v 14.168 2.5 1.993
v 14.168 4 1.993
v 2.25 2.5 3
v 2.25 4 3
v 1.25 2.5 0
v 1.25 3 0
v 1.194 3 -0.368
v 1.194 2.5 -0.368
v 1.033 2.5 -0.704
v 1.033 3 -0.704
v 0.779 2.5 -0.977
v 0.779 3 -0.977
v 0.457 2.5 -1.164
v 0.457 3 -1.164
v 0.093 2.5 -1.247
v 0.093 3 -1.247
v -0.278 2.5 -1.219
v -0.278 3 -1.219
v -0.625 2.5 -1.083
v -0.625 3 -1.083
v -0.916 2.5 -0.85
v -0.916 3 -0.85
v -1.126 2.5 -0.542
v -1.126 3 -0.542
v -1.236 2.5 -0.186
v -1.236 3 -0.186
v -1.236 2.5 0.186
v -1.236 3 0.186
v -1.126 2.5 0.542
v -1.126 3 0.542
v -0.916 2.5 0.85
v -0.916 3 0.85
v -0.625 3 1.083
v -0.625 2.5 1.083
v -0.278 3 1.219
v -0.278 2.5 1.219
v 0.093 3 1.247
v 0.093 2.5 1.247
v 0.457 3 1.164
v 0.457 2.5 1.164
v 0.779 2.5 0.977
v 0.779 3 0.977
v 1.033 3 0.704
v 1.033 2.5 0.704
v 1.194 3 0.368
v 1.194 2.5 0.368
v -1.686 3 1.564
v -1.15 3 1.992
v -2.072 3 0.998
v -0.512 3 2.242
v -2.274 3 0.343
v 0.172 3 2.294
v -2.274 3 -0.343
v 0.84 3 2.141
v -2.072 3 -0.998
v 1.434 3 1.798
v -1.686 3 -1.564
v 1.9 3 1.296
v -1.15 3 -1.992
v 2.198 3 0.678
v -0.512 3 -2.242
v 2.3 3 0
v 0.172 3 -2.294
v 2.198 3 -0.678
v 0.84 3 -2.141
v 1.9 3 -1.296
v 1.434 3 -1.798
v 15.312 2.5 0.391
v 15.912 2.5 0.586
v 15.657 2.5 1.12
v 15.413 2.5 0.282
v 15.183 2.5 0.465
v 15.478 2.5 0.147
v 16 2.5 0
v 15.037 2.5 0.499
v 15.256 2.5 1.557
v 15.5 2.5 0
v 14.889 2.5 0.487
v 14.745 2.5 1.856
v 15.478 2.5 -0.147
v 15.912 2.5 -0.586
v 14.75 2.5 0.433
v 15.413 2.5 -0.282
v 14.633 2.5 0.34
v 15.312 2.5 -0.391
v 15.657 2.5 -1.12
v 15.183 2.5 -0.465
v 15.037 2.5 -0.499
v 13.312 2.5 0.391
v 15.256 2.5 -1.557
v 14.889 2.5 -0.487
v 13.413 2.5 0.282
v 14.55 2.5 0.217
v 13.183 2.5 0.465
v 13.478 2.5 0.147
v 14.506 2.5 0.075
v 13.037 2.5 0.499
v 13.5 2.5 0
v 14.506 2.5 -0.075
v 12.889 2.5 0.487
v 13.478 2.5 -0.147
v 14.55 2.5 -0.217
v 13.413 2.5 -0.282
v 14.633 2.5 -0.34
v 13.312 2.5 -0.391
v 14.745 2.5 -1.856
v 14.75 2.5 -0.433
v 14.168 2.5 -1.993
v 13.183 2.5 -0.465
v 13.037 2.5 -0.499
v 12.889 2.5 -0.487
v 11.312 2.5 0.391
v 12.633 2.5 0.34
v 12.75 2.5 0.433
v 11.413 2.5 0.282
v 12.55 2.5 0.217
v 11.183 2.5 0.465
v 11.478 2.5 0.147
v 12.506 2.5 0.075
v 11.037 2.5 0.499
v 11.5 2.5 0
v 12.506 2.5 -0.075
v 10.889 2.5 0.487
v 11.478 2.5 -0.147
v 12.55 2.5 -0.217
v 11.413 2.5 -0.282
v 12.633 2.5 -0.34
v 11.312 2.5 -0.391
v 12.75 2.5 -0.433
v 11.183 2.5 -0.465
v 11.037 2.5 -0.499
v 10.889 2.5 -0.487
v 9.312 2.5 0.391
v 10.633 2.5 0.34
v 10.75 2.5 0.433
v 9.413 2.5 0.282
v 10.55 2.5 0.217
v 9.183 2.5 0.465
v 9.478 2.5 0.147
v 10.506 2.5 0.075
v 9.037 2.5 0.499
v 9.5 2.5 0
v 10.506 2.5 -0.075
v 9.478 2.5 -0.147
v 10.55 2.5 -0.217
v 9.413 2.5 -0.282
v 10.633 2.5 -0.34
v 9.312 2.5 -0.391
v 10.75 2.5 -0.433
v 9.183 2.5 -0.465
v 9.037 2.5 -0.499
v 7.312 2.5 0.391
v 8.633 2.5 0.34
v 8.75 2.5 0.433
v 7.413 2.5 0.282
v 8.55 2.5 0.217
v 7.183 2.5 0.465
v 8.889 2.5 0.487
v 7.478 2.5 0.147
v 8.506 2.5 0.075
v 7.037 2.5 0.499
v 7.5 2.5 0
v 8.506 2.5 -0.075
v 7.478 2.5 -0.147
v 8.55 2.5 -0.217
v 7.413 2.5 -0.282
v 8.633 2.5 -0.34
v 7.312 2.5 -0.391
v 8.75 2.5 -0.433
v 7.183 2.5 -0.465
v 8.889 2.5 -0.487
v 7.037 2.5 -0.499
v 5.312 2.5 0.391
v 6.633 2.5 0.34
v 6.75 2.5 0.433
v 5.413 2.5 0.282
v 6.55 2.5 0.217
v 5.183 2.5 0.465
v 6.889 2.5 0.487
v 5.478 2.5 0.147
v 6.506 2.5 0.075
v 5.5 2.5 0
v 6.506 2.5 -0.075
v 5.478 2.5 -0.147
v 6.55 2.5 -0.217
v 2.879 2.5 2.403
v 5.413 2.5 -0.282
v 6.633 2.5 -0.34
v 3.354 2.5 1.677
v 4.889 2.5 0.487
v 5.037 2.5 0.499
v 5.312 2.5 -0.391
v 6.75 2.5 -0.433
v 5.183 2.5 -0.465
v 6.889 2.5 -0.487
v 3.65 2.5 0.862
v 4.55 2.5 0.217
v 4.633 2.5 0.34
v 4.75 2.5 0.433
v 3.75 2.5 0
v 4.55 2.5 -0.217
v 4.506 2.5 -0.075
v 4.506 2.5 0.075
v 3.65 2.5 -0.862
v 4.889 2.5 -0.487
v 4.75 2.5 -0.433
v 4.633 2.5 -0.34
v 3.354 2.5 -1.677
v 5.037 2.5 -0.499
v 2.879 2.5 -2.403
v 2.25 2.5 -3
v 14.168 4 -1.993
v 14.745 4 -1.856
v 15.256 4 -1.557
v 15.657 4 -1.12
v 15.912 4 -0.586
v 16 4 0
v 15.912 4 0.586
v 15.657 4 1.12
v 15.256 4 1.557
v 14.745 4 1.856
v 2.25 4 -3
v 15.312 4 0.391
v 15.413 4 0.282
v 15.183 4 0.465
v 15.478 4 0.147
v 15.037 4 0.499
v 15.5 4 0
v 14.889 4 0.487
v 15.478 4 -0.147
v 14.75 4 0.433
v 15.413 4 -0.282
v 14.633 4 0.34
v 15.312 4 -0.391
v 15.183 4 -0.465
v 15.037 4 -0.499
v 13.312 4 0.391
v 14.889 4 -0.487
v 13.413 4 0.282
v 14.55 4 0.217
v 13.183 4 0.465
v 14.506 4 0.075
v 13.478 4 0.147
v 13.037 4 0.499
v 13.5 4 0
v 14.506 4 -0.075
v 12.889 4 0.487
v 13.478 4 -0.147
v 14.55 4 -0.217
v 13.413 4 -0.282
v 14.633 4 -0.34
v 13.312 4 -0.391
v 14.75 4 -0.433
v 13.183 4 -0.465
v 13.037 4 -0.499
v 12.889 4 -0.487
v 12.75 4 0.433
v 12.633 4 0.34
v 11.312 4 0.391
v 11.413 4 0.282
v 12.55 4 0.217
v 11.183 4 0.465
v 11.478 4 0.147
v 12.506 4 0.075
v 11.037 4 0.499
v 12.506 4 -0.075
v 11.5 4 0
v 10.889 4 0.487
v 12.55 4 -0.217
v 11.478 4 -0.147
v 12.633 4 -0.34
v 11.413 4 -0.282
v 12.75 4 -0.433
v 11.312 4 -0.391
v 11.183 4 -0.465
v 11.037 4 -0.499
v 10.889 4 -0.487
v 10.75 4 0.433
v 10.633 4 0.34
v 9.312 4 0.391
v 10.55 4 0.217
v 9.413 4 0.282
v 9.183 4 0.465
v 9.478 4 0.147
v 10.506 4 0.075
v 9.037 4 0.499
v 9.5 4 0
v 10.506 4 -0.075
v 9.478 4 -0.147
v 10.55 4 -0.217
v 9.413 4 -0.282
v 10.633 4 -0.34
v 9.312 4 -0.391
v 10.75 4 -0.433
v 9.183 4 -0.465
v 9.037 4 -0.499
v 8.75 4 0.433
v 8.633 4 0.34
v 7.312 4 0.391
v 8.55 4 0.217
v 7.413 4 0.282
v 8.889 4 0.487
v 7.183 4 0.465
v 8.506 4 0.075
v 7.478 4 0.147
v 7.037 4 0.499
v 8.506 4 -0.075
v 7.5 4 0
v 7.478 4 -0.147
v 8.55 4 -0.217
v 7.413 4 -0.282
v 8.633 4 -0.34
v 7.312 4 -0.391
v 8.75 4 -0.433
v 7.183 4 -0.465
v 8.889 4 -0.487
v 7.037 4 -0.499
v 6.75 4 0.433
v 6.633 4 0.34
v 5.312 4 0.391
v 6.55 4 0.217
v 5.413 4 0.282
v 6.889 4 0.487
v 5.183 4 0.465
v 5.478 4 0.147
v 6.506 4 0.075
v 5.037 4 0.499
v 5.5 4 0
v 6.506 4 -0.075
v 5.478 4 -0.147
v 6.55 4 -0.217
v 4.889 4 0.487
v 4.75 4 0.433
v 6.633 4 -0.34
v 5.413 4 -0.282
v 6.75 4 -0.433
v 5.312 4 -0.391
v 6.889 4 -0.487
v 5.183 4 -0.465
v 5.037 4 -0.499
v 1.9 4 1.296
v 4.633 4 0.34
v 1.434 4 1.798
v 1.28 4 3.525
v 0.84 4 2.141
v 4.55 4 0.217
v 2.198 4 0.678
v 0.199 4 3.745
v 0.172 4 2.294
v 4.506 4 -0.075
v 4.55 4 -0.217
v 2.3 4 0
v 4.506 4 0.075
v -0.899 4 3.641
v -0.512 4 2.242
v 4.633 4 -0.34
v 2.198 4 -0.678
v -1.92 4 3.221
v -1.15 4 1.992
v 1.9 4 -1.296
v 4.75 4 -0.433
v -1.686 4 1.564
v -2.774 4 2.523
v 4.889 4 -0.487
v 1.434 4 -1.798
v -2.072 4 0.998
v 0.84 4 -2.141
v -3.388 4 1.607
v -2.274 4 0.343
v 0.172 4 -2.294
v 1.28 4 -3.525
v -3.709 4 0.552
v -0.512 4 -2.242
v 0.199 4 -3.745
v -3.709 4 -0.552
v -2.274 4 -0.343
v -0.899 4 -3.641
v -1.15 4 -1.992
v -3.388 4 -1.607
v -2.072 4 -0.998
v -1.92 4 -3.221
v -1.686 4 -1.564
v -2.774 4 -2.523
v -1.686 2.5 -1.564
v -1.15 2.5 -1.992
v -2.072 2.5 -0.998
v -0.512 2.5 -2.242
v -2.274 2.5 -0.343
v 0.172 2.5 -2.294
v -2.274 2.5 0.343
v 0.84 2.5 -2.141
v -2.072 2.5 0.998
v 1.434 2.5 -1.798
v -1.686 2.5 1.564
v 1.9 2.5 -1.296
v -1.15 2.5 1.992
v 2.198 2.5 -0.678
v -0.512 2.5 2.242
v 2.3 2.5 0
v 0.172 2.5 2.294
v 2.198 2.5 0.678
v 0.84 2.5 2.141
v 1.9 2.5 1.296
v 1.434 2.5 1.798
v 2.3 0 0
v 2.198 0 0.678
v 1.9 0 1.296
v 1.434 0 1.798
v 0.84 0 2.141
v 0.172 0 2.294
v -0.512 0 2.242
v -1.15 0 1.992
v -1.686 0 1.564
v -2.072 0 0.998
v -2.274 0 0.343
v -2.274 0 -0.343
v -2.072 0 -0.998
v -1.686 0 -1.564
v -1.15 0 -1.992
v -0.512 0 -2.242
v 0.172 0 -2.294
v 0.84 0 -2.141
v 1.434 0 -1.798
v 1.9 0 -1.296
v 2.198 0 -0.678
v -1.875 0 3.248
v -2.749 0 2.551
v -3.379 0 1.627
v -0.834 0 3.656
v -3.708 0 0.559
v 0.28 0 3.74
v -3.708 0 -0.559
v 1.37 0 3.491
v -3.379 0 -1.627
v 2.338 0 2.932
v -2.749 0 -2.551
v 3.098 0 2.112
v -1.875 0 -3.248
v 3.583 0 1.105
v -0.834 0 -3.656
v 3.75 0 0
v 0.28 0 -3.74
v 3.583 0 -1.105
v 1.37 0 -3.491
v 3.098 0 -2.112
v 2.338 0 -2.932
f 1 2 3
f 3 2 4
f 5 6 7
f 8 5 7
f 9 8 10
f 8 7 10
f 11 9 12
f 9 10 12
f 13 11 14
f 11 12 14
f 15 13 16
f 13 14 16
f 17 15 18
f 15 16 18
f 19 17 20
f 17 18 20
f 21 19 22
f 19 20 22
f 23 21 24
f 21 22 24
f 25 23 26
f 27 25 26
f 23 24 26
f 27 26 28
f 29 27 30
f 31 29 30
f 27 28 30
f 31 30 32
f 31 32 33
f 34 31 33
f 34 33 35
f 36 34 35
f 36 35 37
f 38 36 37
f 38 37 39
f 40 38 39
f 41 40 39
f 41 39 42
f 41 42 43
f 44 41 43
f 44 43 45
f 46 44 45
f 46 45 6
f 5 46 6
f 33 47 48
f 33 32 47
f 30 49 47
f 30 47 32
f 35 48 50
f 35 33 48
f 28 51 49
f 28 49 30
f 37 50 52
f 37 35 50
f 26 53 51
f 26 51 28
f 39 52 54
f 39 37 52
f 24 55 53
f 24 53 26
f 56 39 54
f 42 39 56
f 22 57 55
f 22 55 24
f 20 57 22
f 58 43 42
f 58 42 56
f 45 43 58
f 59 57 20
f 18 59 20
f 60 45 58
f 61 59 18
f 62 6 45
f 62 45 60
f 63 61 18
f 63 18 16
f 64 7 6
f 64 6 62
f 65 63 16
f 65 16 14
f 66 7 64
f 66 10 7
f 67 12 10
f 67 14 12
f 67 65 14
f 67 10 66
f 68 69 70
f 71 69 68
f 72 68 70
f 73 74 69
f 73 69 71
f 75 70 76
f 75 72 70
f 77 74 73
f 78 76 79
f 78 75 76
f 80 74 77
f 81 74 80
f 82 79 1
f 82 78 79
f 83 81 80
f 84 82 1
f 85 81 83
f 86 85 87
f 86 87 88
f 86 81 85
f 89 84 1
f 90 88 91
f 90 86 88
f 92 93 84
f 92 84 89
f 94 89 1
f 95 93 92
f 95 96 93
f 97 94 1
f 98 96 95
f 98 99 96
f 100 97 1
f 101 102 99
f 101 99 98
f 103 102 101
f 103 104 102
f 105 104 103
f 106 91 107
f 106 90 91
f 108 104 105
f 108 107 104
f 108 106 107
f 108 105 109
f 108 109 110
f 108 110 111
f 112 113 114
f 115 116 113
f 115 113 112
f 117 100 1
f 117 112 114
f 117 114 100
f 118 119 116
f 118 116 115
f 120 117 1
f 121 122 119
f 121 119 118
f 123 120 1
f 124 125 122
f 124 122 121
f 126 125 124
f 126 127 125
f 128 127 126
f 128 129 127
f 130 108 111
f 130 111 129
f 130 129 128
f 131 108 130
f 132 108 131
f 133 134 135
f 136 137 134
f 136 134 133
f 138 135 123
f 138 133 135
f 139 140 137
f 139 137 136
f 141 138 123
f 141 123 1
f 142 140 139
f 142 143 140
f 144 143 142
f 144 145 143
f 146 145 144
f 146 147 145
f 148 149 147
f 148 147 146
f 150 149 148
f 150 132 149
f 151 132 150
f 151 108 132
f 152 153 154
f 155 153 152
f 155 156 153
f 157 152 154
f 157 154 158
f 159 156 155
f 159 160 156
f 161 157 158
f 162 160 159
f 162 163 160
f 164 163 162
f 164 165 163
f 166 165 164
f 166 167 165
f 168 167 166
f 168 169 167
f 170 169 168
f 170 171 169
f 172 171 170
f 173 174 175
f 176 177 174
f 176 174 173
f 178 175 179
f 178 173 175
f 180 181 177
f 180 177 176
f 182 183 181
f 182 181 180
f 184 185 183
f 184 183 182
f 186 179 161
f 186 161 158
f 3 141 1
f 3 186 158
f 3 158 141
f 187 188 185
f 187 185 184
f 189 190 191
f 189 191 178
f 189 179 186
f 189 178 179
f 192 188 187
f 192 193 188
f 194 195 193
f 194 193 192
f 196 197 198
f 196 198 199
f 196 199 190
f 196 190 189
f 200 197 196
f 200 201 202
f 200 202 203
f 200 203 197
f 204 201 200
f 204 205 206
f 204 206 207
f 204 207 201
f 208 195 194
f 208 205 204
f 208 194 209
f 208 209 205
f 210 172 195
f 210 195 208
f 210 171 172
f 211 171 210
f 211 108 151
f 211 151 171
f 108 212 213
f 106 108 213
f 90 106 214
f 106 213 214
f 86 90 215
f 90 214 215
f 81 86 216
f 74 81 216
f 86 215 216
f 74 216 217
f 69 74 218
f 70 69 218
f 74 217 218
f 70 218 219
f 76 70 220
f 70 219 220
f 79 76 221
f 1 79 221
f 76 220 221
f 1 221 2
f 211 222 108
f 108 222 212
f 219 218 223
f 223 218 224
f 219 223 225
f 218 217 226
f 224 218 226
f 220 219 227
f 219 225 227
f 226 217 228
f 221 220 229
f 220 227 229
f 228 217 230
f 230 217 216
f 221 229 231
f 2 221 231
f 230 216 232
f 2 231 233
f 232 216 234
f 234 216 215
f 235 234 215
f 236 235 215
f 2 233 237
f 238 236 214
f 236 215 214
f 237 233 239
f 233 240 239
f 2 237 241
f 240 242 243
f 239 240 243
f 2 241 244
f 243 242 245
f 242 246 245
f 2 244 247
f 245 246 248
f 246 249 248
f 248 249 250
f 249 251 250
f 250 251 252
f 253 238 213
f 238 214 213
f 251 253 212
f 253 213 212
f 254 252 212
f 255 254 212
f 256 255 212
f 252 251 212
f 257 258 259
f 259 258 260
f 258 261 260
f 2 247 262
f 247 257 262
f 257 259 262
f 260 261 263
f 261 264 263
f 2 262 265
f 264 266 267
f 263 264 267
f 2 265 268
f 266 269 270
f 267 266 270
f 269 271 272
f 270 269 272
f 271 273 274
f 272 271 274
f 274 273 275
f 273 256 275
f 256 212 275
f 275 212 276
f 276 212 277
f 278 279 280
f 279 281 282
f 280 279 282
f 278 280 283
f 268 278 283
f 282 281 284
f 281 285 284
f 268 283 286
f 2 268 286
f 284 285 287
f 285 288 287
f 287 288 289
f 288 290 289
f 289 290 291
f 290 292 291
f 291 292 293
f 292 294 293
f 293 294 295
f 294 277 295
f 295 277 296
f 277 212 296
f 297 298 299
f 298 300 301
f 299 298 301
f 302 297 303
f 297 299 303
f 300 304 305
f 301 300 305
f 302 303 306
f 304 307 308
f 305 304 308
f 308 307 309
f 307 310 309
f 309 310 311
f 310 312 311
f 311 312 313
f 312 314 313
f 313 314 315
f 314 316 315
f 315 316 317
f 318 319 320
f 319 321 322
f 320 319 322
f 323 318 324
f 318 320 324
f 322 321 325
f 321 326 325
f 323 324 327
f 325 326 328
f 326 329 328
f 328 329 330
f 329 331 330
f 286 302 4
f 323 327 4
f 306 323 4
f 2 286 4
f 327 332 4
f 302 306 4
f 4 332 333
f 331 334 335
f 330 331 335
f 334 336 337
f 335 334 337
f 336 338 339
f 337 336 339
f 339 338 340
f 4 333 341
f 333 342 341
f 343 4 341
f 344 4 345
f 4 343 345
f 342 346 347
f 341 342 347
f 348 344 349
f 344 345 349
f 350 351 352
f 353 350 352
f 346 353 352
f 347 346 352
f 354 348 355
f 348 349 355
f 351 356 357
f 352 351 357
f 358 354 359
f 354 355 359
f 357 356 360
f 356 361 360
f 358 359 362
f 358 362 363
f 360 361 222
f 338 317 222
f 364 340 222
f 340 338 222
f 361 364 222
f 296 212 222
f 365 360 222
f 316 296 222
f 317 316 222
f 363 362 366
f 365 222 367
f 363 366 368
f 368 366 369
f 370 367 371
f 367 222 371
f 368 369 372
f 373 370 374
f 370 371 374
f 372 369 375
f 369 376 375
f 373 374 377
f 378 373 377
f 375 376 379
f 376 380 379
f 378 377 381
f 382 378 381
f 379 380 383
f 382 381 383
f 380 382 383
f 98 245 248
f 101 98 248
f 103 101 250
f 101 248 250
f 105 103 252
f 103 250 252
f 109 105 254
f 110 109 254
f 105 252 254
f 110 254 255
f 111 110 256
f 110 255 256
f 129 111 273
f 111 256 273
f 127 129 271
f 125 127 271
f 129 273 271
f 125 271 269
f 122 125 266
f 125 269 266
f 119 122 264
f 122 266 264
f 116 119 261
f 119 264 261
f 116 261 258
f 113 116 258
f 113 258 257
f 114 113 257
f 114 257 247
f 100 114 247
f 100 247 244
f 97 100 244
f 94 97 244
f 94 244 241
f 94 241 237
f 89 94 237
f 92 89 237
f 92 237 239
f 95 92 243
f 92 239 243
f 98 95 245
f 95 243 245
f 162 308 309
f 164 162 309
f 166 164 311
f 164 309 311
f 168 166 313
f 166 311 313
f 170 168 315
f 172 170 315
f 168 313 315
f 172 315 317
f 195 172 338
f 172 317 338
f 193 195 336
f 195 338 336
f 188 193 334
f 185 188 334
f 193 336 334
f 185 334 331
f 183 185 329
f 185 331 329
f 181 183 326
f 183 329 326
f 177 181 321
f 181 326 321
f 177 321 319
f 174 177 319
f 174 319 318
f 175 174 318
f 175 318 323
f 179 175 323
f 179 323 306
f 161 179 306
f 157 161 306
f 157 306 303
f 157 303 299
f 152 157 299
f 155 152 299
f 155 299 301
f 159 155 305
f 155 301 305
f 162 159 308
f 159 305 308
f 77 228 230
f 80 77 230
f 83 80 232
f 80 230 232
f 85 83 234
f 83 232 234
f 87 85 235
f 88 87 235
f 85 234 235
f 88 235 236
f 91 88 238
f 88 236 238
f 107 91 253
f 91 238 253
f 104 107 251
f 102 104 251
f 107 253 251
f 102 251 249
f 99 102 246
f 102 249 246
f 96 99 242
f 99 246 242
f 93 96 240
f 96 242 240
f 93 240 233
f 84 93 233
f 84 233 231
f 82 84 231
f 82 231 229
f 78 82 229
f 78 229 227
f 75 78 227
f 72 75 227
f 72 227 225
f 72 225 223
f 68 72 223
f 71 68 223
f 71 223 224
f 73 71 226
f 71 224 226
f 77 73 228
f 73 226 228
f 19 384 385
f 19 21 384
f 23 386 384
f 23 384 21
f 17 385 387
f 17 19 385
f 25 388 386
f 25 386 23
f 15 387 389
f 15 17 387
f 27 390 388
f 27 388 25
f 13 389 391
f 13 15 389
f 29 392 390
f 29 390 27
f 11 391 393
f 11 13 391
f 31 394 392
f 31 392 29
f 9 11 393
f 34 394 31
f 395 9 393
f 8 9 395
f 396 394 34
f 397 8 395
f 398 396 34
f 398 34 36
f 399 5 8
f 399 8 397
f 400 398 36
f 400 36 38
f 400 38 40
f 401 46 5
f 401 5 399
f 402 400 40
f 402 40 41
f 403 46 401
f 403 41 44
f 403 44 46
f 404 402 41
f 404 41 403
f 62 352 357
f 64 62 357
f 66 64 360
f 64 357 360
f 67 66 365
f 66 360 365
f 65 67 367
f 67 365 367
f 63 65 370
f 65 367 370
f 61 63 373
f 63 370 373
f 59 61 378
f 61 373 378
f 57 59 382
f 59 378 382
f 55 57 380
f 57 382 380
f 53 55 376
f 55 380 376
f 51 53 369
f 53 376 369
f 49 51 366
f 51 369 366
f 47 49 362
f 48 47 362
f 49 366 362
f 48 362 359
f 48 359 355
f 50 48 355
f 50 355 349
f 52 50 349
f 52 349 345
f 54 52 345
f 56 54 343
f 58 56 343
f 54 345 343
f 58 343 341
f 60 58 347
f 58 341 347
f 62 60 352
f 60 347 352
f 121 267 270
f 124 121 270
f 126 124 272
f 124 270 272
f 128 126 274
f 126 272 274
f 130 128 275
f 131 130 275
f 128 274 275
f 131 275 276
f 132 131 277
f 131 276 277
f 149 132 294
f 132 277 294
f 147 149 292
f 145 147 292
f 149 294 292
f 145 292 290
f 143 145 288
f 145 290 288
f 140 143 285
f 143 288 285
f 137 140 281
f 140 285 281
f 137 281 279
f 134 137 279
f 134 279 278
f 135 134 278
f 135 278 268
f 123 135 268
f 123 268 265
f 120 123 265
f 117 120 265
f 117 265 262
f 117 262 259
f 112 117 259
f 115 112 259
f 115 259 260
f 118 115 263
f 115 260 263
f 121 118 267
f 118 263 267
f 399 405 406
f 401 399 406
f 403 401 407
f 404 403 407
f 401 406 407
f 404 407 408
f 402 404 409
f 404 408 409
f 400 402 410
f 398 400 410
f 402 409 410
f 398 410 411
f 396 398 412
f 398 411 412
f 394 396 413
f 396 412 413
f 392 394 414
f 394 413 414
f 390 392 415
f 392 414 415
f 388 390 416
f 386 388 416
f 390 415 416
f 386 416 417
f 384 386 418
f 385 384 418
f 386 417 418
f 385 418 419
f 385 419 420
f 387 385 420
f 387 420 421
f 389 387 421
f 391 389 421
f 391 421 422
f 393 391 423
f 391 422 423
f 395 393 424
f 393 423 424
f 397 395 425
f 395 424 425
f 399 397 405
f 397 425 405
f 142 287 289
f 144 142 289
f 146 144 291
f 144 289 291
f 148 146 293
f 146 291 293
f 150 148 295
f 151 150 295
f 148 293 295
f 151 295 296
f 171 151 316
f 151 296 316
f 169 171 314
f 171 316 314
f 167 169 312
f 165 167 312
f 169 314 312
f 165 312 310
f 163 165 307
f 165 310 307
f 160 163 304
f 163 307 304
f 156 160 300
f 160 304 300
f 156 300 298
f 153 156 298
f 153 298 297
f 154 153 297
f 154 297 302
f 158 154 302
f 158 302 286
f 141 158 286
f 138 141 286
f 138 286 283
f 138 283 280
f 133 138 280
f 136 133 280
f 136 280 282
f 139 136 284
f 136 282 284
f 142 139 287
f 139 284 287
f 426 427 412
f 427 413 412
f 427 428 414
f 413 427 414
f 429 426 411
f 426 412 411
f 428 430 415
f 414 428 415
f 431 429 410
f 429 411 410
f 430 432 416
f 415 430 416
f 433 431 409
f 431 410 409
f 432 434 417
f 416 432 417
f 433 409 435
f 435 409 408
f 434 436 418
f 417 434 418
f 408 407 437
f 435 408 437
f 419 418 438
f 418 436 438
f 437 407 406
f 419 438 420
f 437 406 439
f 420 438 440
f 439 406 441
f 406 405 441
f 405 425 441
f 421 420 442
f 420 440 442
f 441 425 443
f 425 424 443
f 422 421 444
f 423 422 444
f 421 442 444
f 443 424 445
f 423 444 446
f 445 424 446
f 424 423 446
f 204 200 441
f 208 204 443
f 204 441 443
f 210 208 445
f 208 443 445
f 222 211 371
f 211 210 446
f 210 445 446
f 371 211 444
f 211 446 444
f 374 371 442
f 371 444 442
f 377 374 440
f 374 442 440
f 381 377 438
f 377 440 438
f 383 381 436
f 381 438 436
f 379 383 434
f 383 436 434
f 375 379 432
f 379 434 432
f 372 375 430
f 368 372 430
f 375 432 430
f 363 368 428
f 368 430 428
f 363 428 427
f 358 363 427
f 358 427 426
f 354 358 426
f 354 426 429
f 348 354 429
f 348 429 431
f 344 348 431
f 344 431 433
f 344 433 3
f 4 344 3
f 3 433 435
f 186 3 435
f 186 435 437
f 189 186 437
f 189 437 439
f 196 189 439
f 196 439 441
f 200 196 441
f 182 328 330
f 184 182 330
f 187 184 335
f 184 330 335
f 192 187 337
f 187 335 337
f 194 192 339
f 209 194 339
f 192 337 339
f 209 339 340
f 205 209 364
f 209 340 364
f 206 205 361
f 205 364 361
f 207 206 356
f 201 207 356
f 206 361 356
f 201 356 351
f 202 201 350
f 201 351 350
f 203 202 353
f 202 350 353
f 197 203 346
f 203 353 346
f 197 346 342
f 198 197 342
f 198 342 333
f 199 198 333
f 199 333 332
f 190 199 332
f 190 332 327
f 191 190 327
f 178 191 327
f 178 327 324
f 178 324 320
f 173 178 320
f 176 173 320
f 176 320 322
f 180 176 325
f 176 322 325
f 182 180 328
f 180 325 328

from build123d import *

# Parameters (mm, degrees)
SKETCH1_R           = 3.75
BOSS_EXTRUDE1_DEPTH = 4
SKETCH2_R           = 2.3
CUT_EXTRUDE1_DEPTH  = 1
SKETCH3_R           = 0.5
BOSS_EXTRUDE2_DEPTH = 1.5
SKETCH4_R           = 1.25
CUT_EXTRUDE2_DEPTH  = 4.5
SKETCH5_R           = 2.3
CUT_EXTRUDE3_DEPTH  = 2.5


with BuildPart() as part:
    # Sketch1 → Boss-Extrude1 (new body)
    with BuildSketch(Plane(origin=(0, 0, 0), x_dir=(1, 0, 0), z_dir=(0, 1, 0))):
        Circle(SKETCH1_R)
    extrude(amount=BOSS_EXTRUDE1_DEPTH)

    # Sketch2 → Cut-Extrude1 (cut)
    with BuildSketch(Plane(origin=(0, 4, 0), x_dir=(1, 0, 0), z_dir=(0, 1, 0))):
        Circle(SKETCH2_R)
    extrude(amount=-CUT_EXTRUDE1_DEPTH, mode=Mode.SUBTRACT)

    # Sketch3 → Boss-Extrude2 (add)
    with BuildSketch(Plane(origin=(0, 4, 0), x_dir=(1, 0, 0), z_dir=(0, 1, 0))):
        with BuildLine():
            Line((14.168399438, -1.992897797), (2.25, -3))
            ThreePointArc((2.25, -3), (3.75, 0), (2.25, 3))
            Line((2.25, 3), (14.168399438, 1.992897797))
            ThreePointArc((14.168399438, 1.992897797), (16, 0), (14.168399438, -1.992897797))
        make_face()
        with Locations((15, 0)):
            Circle(SKETCH3_R, mode=Mode.SUBTRACT)
        with Locations((5, 0)):
            Circle(SKETCH3_R, mode=Mode.SUBTRACT)
        with Locations((7, 0)):
            Circle(SKETCH3_R, mode=Mode.SUBTRACT)
        with Locations((9, 0)):
            Circle(SKETCH3_R, mode=Mode.SUBTRACT)
        with Locations((11, 0)):
            Circle(SKETCH3_R, mode=Mode.SUBTRACT)
        with Locations((13, 0)):
            Circle(SKETCH3_R, mode=Mode.SUBTRACT)
    extrude(amount=-BOSS_EXTRUDE2_DEPTH)

    # Sketch4 → Cut-Extrude2 (cut)
    with BuildSketch(Plane(origin=(0, 3, 0), x_dir=(1, 0, 0), z_dir=(0, 1, 0))):
        Circle(SKETCH4_R)
    extrude(amount=-CUT_EXTRUDE2_DEPTH, mode=Mode.SUBTRACT)

    # Sketch5 → Cut-Extrude3 (cut)
    with BuildSketch(Plane.XZ):
        Circle(SKETCH5_R)
    extrude(amount=-CUT_EXTRUDE3_DEPTH, mode=Mode.SUBTRACT)


solid = part.part
